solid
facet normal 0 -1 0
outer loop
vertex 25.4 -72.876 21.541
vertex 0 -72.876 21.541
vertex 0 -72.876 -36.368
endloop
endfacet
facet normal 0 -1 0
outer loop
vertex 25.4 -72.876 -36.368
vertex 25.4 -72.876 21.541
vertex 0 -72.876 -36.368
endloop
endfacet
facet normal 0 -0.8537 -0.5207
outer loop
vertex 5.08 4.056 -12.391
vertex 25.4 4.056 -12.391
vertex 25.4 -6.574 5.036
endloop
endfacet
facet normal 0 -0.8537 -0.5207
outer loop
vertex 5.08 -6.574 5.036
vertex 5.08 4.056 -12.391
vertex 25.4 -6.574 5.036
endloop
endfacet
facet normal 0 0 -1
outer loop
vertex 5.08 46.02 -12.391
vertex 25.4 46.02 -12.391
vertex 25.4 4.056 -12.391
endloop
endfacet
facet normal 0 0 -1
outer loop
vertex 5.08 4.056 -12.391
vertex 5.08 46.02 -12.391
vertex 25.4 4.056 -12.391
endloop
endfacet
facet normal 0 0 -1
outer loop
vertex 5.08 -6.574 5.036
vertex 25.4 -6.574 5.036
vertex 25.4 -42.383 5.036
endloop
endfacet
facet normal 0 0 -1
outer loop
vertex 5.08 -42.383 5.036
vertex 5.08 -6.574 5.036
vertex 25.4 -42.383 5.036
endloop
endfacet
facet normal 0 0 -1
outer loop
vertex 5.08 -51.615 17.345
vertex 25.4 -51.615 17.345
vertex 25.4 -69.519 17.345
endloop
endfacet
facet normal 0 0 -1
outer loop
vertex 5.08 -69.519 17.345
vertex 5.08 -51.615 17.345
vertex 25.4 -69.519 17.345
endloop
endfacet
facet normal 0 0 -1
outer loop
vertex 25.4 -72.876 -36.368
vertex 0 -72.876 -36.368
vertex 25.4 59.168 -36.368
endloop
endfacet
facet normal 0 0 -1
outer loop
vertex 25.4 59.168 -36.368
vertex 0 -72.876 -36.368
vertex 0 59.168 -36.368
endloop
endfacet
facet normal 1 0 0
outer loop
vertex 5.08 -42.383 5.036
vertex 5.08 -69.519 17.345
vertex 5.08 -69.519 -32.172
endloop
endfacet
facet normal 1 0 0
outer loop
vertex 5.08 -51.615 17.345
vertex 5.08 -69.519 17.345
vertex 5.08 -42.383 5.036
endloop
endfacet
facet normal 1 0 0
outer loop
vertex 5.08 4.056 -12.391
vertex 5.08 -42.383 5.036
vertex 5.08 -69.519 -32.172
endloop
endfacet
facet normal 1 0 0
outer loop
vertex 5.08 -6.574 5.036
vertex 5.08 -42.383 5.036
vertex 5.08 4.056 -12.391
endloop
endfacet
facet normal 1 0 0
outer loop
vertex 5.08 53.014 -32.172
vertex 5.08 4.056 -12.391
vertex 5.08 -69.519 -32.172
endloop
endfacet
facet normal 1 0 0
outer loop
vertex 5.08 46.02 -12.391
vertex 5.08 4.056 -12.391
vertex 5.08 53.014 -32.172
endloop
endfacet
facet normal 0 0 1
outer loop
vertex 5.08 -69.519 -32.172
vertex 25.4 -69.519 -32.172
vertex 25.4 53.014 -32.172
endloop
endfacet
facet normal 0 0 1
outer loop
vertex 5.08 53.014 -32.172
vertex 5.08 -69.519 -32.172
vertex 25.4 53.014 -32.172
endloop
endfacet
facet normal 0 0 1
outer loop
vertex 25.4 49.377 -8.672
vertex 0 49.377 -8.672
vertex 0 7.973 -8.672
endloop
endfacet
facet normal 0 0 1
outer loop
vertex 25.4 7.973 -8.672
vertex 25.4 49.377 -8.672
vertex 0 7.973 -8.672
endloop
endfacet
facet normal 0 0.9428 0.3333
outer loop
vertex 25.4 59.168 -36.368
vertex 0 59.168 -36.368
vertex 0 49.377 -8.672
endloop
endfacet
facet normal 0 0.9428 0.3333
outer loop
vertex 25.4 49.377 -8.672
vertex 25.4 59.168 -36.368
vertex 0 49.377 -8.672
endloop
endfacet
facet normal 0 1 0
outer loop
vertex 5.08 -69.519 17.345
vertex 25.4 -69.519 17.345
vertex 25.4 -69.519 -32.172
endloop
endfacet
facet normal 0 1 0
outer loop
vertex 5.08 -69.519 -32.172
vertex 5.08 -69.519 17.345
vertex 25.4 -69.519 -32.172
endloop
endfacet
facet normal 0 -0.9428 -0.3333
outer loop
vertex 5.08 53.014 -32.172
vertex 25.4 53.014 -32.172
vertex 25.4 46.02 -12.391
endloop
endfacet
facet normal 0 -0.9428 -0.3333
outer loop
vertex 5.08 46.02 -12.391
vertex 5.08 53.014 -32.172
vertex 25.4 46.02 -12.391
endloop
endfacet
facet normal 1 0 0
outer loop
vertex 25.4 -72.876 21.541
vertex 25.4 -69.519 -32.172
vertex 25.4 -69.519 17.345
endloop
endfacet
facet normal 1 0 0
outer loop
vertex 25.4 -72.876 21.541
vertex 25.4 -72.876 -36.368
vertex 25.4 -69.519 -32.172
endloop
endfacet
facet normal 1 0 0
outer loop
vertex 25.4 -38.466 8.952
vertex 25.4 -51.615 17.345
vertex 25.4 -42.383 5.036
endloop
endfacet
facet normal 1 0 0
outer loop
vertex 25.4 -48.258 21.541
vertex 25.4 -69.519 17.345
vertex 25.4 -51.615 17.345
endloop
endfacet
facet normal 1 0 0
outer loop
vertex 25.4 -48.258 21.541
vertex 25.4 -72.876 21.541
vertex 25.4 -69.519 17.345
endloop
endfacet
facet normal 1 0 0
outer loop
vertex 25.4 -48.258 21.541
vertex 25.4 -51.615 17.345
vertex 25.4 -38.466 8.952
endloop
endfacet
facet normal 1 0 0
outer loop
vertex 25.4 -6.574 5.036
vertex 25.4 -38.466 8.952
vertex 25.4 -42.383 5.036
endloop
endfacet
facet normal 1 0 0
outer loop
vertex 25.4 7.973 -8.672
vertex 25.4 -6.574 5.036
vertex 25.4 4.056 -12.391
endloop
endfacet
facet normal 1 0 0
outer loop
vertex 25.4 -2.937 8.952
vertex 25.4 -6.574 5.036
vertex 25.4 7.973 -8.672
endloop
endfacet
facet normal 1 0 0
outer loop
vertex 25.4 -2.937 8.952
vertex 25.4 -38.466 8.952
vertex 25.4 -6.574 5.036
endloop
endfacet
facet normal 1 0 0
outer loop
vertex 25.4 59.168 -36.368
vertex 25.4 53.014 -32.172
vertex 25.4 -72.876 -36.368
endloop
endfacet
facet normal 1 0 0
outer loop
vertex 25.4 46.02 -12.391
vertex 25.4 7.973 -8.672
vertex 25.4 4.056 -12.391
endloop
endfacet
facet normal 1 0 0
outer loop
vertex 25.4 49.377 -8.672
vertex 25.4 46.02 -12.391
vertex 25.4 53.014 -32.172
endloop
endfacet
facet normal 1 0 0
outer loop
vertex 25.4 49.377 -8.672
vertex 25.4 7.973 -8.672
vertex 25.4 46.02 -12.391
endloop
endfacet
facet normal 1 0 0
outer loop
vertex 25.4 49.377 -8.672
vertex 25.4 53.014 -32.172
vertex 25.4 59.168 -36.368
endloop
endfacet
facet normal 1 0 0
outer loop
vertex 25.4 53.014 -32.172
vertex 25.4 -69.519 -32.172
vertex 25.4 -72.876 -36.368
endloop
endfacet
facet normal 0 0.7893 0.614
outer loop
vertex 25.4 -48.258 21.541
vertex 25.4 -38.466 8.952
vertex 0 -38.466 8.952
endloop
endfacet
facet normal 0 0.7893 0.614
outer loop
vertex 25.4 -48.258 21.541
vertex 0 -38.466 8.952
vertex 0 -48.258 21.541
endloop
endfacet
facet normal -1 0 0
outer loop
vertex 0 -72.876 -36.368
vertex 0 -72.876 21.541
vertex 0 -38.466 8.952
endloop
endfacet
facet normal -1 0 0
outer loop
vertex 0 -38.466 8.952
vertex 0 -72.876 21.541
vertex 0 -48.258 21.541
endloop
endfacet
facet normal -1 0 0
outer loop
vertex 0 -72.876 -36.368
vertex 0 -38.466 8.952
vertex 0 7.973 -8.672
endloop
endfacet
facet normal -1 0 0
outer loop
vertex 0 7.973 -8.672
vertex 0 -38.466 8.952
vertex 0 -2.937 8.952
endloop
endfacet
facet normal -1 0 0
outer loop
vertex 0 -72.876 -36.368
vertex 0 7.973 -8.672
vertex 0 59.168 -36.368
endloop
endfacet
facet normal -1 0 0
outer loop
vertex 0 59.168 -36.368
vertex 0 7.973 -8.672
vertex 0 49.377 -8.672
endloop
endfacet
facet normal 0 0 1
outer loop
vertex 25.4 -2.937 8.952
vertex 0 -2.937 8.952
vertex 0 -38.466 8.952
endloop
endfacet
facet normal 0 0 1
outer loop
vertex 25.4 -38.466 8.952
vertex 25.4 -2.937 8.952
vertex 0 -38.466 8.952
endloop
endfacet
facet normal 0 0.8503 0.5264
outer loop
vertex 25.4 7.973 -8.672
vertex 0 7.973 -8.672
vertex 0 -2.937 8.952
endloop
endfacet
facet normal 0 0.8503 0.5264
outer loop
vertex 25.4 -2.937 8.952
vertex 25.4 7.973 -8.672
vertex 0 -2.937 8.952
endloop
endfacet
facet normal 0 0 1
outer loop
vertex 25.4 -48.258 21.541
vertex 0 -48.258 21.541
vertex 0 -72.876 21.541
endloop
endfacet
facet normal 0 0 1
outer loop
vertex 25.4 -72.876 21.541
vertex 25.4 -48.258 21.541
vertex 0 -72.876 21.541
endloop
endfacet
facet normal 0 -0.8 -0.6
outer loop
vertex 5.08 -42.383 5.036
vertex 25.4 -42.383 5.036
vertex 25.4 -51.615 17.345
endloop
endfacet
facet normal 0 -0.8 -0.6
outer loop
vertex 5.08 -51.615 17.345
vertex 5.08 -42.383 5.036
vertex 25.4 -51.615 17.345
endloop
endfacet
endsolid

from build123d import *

# Parameters (mm, degrees)
F1_DEPTH  = 25.4
F3_DEPTH  = 25.4
F5_DEPTH  = 25.4
F7_DEPTH  = 5.08
F10_DEPTH = 5.08
F11_DEPTH = 5.08


with BuildPart() as f1:
    # F0 (on Right) → F1 (new body)
    with BuildSketch(Plane.YZ):
        Polygon((59.1682344675, -36.3681837916), (49.3768006563, -8.6724124849), (7.9730236903, -8.6724124849), (-2.9374300502, 8.9521678165), (-38.4663492441, 8.9521678165), (-48.2577830553, 21.5411558747), (-72.8762373328, 21.5411558747), (-72.8762373328, -30.4933227599), (-72.8762373328, -36.3681837916), align=None)
    extrude(amount=F1_DEPTH)

    # F2 (on Right) → F3 (cut)
    with BuildSketch(Plane.YZ):
        Polygon((-51.3350889087, 17.6245812327), (-67.5608962774, 17.3448249698), (-67.5608962774, -31.8920984864), (51.6148433089, -31.8920984864), (45.1804734766, -13.4282521904), (5.4552280344, -13.4282521904), (-6.2944926322, 5.0355945714), (-42.103163898, 5.0355945714), align=None)
    extrude(amount=-F3_DEPTH, mode=Mode.SUBTRACT)

    # F4 (on face) → F5 (cut)
    with BuildSketch(Plane.YZ.offset(25.4)):
        Polygon((-51.6148433089, 17.3448249698), (-69.5191770792, 17.3448249698), (-69.5191770792, -32.1718528867), (53.0136227608, -32.1718528867), (46.0203764525, -12.3909551978), (4.0564518422, -12.3909551978), (-6.574248895, 5.0355945714), (-42.3829182982, 5.0355945714), align=None)
    extrude(amount=-F5_DEPTH, mode=Mode.SUBTRACT)

    # F6 (on Right) → F7 (join)
    with BuildSketch(Plane.YZ):
        Polygon((53.0136190355, -31.6123440862), (45.7399822772, -12.5889861956), (4.3362067081, -12.8687405959), (-6.0147377662, 4.1963290423), (-42.1031676233, 4.1963290423), (-51.3350889087, 16.5055599064), (-68.9596682787, 16.5055599064), (-68.4001594782, -31.6123440862), align=None)
    extrude(amount=F7_DEPTH)

    # F8 (on Right) → F10 (join)
    with BuildSketch(Plane.YZ):
        Polygon((5.4552271031, -11.7497202009), (-7.4135139585, 4.7558392398), (-42.1031676233, 4.7558392398), (-50.7755763829, 17.0650705695), (-69.7989314795, 17.0650705695), (-69.7989314795, -30.213566497), (-69.7989314795, -32.1718528867), (53.0136190355, -32.1718528867), (46.8590036035, -11.7497202009), align=None)
    extrude(amount=F10_DEPTH)

    # F9 (on Right) → F11 (join)
    with BuildSketch(Plane.YZ):
        Polygon((56.2891028821, -33.4541499615), (49.1134338081, -13.0950817838), (49.1134338081, -10.6687908992), (7.4033048004, -10.6687908992), (-4.491108004, 6.529154256), (-40.5934713781, 6.529154256), (-49.6454611421, 18.8511218876), (-70.4428181052, 18.8511218876), (-70.4428181052, -33.4541499615), align=None)
    extrude(amount=F11_DEPTH)


solid = f1.part
